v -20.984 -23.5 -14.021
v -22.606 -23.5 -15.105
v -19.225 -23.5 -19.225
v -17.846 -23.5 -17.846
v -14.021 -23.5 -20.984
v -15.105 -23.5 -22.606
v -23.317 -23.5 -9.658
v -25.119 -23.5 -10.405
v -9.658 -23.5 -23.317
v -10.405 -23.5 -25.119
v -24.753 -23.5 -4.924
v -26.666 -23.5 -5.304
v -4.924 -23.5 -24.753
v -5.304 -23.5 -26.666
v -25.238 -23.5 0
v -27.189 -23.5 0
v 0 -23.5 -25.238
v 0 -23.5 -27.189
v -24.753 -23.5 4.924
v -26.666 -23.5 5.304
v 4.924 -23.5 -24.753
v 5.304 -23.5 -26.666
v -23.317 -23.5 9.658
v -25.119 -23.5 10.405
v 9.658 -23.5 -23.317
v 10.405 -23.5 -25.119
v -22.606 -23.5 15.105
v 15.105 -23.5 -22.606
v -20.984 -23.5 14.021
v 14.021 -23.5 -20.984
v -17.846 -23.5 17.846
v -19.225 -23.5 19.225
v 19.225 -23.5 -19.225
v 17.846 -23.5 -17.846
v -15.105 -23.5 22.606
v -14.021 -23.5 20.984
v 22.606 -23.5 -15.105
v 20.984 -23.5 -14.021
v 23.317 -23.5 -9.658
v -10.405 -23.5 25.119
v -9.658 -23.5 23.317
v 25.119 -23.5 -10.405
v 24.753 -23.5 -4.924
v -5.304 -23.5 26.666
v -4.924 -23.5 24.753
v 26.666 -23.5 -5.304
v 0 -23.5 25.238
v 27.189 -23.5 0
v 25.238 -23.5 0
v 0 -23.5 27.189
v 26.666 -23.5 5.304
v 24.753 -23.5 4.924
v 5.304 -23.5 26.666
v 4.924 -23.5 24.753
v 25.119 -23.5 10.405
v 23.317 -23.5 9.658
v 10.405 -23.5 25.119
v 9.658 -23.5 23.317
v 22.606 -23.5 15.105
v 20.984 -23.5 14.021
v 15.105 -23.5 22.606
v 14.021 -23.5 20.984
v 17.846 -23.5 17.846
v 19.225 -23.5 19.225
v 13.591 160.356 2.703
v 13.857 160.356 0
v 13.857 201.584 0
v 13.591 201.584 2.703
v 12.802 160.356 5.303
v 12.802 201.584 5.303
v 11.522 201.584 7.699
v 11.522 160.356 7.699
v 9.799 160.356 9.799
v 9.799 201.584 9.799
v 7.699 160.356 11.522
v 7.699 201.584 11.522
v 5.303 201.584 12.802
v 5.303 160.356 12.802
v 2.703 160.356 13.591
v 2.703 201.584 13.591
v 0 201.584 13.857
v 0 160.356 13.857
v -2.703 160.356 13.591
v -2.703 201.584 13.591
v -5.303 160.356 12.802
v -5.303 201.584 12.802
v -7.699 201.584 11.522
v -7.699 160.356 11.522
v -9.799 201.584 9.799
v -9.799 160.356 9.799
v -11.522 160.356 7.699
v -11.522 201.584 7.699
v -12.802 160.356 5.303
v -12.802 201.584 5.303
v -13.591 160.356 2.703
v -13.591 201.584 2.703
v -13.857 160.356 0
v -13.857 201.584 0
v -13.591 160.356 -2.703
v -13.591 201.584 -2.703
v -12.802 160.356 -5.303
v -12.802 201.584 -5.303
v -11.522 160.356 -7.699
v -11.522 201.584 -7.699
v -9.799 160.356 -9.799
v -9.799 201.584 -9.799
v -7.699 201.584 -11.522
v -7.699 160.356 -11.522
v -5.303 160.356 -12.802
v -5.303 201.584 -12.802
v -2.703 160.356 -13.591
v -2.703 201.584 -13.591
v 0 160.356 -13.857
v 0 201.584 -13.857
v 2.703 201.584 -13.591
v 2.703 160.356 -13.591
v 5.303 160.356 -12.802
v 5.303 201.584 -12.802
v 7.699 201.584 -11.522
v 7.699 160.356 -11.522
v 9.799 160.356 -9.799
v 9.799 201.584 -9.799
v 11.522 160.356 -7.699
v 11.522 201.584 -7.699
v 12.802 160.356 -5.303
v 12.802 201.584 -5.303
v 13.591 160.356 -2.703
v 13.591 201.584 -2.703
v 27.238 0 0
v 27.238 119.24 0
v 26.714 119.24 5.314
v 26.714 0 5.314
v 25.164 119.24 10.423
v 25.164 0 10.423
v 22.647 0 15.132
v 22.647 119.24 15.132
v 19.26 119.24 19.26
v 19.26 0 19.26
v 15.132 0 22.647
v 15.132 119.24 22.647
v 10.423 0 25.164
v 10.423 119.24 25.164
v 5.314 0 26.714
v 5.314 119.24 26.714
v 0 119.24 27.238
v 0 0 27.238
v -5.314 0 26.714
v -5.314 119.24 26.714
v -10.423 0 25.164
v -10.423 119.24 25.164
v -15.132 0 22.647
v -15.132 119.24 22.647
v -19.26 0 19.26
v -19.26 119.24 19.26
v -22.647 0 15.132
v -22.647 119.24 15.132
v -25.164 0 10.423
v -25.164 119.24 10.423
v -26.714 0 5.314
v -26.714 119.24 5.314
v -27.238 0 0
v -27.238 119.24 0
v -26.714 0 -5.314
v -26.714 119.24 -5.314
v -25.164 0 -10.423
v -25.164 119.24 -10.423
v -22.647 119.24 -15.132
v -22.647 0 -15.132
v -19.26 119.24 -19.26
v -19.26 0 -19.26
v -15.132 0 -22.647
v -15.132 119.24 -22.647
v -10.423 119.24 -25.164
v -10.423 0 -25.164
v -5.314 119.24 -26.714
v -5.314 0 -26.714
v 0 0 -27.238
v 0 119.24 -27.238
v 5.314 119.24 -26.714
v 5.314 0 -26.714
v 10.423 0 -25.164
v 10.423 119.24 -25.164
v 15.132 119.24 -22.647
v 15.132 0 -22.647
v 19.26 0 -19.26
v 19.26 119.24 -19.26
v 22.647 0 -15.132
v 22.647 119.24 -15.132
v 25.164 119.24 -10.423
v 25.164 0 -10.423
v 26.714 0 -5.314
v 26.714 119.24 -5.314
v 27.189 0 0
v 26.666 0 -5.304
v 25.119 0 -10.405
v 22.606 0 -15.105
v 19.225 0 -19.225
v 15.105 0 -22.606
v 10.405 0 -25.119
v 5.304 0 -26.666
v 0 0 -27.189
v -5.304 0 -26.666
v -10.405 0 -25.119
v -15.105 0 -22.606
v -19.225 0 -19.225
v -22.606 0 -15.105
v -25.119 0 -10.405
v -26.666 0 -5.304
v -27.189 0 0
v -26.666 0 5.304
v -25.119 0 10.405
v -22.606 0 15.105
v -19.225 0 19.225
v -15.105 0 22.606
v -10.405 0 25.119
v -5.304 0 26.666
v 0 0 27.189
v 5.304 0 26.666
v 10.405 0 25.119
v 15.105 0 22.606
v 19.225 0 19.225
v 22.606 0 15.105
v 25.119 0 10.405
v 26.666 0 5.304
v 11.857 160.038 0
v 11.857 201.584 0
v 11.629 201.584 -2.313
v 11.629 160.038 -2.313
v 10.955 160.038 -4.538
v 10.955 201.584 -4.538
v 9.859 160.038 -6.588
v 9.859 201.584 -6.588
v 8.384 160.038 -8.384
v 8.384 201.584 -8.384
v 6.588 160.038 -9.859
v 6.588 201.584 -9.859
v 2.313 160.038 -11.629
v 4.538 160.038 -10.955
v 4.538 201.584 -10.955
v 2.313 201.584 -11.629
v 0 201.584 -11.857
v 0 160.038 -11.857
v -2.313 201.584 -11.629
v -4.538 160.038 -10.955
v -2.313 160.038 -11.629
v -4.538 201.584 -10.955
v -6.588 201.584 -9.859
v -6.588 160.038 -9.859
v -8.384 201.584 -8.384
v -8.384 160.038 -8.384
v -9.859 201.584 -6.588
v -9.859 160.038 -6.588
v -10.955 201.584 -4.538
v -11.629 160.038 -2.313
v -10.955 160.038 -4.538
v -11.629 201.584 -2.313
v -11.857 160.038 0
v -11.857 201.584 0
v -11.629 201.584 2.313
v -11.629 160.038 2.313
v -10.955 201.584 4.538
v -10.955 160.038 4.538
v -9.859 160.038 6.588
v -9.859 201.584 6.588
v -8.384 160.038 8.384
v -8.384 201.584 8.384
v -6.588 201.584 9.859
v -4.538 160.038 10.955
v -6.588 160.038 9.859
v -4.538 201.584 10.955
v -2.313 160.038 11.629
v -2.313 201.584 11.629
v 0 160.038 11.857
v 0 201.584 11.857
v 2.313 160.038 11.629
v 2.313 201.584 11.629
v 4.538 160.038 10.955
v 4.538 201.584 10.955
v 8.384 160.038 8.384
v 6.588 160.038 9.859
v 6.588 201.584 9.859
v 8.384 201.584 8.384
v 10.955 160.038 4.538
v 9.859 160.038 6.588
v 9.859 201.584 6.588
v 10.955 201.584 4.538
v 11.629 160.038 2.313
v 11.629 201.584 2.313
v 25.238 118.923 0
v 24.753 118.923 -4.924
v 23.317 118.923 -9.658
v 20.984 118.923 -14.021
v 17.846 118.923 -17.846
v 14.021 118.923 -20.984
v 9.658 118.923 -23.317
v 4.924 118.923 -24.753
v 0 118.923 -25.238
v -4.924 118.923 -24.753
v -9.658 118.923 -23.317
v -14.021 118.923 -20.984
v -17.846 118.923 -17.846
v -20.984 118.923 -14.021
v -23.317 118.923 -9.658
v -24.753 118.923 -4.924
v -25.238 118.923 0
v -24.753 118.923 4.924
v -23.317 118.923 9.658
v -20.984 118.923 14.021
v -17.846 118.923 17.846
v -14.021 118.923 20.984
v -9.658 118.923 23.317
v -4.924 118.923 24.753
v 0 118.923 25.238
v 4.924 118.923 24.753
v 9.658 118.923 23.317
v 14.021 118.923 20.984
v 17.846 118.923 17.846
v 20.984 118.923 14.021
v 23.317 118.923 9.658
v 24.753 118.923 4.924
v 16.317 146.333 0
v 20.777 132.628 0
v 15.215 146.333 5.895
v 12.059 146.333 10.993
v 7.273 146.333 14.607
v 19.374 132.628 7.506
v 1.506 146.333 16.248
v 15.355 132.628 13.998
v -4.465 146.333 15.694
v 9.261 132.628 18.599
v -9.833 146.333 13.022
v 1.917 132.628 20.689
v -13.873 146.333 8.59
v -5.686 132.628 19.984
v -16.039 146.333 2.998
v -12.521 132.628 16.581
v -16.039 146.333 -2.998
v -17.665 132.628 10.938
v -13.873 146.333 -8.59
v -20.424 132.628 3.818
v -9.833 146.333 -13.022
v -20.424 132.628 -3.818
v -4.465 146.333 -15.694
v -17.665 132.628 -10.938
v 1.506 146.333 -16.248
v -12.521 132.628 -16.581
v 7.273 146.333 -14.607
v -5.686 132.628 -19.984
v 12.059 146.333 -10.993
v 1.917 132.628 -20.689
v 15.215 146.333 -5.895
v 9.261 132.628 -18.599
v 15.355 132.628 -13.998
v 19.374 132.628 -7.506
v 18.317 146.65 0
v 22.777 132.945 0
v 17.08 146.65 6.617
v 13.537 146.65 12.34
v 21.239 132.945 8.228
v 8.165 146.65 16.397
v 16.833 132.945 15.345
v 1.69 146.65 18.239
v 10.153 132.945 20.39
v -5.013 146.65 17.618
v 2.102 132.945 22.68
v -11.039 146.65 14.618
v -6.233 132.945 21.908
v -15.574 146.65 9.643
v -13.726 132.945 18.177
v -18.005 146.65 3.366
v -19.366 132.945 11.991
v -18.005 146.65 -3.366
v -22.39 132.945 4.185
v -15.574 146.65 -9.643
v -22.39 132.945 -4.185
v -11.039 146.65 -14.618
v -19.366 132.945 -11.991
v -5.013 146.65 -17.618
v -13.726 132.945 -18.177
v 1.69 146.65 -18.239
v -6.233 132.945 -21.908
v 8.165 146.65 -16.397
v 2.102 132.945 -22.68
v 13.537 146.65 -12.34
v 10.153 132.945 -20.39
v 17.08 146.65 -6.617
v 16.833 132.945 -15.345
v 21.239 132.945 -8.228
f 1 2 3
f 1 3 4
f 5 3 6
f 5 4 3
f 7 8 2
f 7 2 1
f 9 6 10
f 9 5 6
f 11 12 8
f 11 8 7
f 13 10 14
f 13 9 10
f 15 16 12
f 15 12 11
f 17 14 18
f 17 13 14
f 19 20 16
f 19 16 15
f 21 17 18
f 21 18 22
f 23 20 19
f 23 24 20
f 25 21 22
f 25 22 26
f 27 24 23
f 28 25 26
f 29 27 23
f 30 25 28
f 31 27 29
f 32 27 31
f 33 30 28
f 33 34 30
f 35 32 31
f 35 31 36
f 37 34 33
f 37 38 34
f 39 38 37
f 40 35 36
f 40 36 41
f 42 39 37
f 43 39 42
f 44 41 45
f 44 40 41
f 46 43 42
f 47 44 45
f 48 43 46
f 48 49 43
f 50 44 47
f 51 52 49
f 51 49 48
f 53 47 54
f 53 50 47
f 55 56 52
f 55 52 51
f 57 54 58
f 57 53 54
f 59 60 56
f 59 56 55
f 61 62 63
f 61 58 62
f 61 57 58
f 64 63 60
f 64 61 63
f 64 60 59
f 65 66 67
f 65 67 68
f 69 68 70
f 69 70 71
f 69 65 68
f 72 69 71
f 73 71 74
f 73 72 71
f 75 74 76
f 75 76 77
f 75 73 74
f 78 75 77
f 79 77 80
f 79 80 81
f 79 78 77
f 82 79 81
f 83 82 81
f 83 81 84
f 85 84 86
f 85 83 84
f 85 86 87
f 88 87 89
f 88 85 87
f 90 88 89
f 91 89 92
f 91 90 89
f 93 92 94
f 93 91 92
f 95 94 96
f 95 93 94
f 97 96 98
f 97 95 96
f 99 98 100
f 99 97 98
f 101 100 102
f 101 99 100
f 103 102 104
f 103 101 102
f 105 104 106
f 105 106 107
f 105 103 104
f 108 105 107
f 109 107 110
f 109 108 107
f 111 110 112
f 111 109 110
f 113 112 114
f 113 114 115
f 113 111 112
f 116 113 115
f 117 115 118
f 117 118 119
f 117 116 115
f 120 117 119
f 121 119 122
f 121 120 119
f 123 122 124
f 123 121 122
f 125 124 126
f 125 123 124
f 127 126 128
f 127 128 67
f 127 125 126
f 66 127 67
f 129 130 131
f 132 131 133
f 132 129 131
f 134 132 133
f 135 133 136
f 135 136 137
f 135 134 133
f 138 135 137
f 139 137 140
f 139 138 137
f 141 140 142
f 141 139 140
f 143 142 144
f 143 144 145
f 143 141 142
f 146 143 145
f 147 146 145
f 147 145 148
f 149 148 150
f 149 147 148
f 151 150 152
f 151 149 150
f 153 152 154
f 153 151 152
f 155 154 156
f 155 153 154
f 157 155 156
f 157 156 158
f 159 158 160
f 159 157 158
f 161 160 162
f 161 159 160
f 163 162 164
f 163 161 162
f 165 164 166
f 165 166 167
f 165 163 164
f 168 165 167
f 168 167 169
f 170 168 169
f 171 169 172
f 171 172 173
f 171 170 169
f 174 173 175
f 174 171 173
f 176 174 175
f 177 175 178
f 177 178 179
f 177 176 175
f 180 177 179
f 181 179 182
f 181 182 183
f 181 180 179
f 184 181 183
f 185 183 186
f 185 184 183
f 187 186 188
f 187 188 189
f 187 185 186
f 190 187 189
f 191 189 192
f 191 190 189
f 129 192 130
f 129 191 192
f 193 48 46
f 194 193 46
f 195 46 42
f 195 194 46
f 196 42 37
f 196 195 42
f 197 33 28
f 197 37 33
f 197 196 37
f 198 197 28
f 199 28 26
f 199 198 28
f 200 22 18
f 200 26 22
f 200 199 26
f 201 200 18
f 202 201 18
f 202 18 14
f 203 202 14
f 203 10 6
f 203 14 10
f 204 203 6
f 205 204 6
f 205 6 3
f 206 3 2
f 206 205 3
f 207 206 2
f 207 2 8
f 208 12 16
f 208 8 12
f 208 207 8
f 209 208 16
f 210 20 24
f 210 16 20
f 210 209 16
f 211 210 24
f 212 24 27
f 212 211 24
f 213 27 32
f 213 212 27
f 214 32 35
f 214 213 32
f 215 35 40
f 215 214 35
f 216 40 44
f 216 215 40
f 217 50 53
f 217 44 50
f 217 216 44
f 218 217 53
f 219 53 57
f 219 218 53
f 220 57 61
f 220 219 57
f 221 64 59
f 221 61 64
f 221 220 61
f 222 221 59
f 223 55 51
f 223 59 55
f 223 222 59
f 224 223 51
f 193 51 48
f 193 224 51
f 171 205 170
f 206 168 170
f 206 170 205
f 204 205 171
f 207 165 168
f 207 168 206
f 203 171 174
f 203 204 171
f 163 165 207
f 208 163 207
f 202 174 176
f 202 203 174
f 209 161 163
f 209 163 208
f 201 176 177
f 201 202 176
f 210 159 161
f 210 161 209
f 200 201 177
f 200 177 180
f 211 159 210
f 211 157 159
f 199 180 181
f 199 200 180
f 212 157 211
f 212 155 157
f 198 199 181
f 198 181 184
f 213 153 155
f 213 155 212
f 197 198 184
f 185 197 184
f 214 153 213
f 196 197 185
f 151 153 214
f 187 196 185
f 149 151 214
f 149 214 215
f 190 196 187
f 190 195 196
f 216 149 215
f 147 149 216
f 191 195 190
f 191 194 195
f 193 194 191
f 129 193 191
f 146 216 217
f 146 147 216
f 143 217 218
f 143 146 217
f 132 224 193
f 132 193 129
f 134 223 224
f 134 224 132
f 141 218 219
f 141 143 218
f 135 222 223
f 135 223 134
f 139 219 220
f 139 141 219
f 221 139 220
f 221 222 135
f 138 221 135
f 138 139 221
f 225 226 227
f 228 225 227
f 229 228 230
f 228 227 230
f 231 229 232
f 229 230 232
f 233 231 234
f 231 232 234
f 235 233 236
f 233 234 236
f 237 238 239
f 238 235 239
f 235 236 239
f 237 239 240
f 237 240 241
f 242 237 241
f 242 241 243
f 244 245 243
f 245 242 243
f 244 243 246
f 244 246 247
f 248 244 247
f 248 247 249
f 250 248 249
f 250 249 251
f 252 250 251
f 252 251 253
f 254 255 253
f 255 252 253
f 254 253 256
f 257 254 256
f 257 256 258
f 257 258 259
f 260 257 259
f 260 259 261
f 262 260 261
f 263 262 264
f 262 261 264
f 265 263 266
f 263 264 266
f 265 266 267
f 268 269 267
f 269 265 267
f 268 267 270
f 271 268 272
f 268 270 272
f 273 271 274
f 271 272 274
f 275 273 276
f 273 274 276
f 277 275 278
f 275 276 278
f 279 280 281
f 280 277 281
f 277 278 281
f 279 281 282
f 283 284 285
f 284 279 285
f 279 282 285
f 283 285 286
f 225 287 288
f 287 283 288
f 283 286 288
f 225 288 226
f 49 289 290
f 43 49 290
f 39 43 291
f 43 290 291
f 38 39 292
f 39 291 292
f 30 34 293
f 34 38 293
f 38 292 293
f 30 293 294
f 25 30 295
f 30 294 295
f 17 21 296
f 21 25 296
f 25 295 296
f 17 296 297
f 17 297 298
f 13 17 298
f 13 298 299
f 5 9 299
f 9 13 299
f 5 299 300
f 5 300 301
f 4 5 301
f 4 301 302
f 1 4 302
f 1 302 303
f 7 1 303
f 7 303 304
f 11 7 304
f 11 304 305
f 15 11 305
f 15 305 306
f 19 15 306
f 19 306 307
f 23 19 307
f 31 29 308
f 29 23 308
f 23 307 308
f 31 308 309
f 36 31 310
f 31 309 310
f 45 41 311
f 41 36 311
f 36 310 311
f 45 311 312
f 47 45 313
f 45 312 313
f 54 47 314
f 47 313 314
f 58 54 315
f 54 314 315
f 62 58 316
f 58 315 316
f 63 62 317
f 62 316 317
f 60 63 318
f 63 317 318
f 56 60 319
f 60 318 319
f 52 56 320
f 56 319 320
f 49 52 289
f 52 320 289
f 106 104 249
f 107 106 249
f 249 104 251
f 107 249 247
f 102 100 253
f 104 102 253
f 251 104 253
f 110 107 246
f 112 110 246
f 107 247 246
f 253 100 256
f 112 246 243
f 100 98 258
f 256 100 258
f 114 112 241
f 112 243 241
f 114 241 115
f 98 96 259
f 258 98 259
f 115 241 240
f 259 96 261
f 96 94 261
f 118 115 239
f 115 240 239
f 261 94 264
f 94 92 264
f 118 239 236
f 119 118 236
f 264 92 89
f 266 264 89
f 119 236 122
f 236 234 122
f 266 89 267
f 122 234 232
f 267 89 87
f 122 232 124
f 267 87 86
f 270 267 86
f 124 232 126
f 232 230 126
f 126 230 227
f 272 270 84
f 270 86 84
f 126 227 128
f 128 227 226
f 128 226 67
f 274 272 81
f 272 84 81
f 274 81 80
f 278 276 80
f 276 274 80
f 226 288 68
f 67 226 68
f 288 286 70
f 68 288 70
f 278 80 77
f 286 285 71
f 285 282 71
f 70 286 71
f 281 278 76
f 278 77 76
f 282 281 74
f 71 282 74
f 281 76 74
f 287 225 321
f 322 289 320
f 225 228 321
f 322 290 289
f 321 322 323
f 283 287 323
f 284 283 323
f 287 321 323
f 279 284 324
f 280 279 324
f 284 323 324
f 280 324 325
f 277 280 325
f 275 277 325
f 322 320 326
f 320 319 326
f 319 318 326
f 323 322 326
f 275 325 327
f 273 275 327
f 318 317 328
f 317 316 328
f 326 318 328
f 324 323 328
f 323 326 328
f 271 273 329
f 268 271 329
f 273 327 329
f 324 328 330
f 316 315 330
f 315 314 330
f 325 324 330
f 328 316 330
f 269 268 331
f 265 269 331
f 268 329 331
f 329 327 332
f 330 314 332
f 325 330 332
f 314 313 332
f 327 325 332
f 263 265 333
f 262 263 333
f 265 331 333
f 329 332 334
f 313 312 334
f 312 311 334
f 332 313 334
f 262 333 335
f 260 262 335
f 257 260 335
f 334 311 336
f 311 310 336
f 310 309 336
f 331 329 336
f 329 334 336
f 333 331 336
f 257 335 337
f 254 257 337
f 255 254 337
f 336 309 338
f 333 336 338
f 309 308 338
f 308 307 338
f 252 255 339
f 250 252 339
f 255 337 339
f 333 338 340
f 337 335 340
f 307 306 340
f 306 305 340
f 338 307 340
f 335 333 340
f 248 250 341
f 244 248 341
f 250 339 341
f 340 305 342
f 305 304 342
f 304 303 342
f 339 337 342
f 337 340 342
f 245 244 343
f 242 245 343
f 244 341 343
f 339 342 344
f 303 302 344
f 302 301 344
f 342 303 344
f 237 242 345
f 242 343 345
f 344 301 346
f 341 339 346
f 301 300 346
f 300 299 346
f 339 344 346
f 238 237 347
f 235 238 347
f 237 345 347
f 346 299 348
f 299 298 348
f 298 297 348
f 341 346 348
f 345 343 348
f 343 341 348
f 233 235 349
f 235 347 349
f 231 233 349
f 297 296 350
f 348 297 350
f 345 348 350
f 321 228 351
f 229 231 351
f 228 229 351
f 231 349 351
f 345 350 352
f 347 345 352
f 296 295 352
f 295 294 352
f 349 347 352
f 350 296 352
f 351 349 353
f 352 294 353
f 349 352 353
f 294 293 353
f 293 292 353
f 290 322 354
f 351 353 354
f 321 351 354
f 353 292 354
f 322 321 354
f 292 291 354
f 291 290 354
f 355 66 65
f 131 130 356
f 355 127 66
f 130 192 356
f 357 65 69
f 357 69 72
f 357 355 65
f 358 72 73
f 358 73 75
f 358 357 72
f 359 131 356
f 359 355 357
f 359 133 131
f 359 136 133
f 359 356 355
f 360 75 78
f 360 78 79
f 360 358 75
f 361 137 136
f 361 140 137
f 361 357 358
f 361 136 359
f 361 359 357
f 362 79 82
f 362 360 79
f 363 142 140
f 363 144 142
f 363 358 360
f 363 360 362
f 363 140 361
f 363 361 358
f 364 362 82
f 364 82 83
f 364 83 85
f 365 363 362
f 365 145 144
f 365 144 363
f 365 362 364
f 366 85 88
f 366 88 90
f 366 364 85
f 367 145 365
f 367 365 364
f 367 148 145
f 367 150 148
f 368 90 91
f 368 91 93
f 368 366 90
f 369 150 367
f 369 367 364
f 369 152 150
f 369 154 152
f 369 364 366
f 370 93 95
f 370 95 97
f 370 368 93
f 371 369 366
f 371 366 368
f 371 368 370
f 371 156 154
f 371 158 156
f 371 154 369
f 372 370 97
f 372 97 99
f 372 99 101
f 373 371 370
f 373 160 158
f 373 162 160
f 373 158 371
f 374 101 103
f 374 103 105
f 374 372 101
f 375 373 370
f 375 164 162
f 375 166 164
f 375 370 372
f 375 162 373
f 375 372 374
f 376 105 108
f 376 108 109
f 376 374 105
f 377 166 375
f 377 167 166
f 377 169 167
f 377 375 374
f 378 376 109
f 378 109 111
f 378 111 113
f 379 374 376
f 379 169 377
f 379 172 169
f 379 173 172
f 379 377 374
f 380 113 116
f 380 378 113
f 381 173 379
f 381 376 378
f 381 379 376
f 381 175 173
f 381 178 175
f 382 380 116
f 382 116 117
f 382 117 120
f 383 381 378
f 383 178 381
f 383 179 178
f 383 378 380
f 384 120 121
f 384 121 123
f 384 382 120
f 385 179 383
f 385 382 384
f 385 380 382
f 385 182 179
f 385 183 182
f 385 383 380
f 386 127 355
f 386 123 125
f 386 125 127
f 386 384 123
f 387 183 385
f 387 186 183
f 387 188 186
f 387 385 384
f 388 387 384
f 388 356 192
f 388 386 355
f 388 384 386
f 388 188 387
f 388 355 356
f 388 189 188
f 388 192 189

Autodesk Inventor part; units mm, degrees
ref_plane "YZ Plane" through (0, 0, 0) normal (1, 0, 0) x (0, 1, 0)
ref_plane "XZ Plane" through (0, 0, 0) normal (0, 1, 0) x (-1, 0, 0)
ref_plane "XY Plane" through (0, 0, 0) normal (0, 0, 1) x (1, 0, 0)
sketch "Esquisse3" plane through (0, 0, 0) normal (0, 0, 1) x (1, 0, 0)
  line L0 (0, 0) -> (25.2376, 0)
  line L1 (25.2376, 0) -> (25.2376, 58.756)
  line L2 (25.2376, 58.756) -> (25.2376, 118.9226)
  line L3 (25.2376, 118.9226) -> (11.8572, 160.0383)
  line L4 (11.8572, 160.0383) -> (11.8572, 201.5839)
  line L5 (0, 244.1266) -> (0, -47.634)
  line L6 (13.8572, 201.5839) -> (13.8572, 160.3556)
  line L7 (13.8572, 160.3556) -> (27.2376, 119.2398)
  line L8 (27.2376, 119.2398) -> (27.2376, 58.756)
  line L9 (27.2376, 58.756) -> (27.2376, -2)
  line L10 (27.2376, -2) -> (0, -2)
  line L11 (11.8572, 201.5839) -> (13.8572, 201.5839)
  line L12 (25.2376, 0) -> (27.2376, 0)
  dimension "d2" = 58.756
  dimension "d3" = 90
  dimension "d4" = 2
revolve "Révolution1" add sketch "Esquisse3" angle 360 about axis through (0, 244.1266, 0) along (0, -1, 0) contours L1 L2 L3 L4 L11 L6 L7 L8 L9 L12
sketch "Esquisse4" plane through (0, 0, 0) normal (0, -1, 0) x (1, 0, 0)
  circle A0 centre (0, 0) radius 25.2376
  circle A1 centre (0, 0) radius 27.1886
extrude "Extrusion1" add sketch "Esquisse4" along normal blind 23.5
